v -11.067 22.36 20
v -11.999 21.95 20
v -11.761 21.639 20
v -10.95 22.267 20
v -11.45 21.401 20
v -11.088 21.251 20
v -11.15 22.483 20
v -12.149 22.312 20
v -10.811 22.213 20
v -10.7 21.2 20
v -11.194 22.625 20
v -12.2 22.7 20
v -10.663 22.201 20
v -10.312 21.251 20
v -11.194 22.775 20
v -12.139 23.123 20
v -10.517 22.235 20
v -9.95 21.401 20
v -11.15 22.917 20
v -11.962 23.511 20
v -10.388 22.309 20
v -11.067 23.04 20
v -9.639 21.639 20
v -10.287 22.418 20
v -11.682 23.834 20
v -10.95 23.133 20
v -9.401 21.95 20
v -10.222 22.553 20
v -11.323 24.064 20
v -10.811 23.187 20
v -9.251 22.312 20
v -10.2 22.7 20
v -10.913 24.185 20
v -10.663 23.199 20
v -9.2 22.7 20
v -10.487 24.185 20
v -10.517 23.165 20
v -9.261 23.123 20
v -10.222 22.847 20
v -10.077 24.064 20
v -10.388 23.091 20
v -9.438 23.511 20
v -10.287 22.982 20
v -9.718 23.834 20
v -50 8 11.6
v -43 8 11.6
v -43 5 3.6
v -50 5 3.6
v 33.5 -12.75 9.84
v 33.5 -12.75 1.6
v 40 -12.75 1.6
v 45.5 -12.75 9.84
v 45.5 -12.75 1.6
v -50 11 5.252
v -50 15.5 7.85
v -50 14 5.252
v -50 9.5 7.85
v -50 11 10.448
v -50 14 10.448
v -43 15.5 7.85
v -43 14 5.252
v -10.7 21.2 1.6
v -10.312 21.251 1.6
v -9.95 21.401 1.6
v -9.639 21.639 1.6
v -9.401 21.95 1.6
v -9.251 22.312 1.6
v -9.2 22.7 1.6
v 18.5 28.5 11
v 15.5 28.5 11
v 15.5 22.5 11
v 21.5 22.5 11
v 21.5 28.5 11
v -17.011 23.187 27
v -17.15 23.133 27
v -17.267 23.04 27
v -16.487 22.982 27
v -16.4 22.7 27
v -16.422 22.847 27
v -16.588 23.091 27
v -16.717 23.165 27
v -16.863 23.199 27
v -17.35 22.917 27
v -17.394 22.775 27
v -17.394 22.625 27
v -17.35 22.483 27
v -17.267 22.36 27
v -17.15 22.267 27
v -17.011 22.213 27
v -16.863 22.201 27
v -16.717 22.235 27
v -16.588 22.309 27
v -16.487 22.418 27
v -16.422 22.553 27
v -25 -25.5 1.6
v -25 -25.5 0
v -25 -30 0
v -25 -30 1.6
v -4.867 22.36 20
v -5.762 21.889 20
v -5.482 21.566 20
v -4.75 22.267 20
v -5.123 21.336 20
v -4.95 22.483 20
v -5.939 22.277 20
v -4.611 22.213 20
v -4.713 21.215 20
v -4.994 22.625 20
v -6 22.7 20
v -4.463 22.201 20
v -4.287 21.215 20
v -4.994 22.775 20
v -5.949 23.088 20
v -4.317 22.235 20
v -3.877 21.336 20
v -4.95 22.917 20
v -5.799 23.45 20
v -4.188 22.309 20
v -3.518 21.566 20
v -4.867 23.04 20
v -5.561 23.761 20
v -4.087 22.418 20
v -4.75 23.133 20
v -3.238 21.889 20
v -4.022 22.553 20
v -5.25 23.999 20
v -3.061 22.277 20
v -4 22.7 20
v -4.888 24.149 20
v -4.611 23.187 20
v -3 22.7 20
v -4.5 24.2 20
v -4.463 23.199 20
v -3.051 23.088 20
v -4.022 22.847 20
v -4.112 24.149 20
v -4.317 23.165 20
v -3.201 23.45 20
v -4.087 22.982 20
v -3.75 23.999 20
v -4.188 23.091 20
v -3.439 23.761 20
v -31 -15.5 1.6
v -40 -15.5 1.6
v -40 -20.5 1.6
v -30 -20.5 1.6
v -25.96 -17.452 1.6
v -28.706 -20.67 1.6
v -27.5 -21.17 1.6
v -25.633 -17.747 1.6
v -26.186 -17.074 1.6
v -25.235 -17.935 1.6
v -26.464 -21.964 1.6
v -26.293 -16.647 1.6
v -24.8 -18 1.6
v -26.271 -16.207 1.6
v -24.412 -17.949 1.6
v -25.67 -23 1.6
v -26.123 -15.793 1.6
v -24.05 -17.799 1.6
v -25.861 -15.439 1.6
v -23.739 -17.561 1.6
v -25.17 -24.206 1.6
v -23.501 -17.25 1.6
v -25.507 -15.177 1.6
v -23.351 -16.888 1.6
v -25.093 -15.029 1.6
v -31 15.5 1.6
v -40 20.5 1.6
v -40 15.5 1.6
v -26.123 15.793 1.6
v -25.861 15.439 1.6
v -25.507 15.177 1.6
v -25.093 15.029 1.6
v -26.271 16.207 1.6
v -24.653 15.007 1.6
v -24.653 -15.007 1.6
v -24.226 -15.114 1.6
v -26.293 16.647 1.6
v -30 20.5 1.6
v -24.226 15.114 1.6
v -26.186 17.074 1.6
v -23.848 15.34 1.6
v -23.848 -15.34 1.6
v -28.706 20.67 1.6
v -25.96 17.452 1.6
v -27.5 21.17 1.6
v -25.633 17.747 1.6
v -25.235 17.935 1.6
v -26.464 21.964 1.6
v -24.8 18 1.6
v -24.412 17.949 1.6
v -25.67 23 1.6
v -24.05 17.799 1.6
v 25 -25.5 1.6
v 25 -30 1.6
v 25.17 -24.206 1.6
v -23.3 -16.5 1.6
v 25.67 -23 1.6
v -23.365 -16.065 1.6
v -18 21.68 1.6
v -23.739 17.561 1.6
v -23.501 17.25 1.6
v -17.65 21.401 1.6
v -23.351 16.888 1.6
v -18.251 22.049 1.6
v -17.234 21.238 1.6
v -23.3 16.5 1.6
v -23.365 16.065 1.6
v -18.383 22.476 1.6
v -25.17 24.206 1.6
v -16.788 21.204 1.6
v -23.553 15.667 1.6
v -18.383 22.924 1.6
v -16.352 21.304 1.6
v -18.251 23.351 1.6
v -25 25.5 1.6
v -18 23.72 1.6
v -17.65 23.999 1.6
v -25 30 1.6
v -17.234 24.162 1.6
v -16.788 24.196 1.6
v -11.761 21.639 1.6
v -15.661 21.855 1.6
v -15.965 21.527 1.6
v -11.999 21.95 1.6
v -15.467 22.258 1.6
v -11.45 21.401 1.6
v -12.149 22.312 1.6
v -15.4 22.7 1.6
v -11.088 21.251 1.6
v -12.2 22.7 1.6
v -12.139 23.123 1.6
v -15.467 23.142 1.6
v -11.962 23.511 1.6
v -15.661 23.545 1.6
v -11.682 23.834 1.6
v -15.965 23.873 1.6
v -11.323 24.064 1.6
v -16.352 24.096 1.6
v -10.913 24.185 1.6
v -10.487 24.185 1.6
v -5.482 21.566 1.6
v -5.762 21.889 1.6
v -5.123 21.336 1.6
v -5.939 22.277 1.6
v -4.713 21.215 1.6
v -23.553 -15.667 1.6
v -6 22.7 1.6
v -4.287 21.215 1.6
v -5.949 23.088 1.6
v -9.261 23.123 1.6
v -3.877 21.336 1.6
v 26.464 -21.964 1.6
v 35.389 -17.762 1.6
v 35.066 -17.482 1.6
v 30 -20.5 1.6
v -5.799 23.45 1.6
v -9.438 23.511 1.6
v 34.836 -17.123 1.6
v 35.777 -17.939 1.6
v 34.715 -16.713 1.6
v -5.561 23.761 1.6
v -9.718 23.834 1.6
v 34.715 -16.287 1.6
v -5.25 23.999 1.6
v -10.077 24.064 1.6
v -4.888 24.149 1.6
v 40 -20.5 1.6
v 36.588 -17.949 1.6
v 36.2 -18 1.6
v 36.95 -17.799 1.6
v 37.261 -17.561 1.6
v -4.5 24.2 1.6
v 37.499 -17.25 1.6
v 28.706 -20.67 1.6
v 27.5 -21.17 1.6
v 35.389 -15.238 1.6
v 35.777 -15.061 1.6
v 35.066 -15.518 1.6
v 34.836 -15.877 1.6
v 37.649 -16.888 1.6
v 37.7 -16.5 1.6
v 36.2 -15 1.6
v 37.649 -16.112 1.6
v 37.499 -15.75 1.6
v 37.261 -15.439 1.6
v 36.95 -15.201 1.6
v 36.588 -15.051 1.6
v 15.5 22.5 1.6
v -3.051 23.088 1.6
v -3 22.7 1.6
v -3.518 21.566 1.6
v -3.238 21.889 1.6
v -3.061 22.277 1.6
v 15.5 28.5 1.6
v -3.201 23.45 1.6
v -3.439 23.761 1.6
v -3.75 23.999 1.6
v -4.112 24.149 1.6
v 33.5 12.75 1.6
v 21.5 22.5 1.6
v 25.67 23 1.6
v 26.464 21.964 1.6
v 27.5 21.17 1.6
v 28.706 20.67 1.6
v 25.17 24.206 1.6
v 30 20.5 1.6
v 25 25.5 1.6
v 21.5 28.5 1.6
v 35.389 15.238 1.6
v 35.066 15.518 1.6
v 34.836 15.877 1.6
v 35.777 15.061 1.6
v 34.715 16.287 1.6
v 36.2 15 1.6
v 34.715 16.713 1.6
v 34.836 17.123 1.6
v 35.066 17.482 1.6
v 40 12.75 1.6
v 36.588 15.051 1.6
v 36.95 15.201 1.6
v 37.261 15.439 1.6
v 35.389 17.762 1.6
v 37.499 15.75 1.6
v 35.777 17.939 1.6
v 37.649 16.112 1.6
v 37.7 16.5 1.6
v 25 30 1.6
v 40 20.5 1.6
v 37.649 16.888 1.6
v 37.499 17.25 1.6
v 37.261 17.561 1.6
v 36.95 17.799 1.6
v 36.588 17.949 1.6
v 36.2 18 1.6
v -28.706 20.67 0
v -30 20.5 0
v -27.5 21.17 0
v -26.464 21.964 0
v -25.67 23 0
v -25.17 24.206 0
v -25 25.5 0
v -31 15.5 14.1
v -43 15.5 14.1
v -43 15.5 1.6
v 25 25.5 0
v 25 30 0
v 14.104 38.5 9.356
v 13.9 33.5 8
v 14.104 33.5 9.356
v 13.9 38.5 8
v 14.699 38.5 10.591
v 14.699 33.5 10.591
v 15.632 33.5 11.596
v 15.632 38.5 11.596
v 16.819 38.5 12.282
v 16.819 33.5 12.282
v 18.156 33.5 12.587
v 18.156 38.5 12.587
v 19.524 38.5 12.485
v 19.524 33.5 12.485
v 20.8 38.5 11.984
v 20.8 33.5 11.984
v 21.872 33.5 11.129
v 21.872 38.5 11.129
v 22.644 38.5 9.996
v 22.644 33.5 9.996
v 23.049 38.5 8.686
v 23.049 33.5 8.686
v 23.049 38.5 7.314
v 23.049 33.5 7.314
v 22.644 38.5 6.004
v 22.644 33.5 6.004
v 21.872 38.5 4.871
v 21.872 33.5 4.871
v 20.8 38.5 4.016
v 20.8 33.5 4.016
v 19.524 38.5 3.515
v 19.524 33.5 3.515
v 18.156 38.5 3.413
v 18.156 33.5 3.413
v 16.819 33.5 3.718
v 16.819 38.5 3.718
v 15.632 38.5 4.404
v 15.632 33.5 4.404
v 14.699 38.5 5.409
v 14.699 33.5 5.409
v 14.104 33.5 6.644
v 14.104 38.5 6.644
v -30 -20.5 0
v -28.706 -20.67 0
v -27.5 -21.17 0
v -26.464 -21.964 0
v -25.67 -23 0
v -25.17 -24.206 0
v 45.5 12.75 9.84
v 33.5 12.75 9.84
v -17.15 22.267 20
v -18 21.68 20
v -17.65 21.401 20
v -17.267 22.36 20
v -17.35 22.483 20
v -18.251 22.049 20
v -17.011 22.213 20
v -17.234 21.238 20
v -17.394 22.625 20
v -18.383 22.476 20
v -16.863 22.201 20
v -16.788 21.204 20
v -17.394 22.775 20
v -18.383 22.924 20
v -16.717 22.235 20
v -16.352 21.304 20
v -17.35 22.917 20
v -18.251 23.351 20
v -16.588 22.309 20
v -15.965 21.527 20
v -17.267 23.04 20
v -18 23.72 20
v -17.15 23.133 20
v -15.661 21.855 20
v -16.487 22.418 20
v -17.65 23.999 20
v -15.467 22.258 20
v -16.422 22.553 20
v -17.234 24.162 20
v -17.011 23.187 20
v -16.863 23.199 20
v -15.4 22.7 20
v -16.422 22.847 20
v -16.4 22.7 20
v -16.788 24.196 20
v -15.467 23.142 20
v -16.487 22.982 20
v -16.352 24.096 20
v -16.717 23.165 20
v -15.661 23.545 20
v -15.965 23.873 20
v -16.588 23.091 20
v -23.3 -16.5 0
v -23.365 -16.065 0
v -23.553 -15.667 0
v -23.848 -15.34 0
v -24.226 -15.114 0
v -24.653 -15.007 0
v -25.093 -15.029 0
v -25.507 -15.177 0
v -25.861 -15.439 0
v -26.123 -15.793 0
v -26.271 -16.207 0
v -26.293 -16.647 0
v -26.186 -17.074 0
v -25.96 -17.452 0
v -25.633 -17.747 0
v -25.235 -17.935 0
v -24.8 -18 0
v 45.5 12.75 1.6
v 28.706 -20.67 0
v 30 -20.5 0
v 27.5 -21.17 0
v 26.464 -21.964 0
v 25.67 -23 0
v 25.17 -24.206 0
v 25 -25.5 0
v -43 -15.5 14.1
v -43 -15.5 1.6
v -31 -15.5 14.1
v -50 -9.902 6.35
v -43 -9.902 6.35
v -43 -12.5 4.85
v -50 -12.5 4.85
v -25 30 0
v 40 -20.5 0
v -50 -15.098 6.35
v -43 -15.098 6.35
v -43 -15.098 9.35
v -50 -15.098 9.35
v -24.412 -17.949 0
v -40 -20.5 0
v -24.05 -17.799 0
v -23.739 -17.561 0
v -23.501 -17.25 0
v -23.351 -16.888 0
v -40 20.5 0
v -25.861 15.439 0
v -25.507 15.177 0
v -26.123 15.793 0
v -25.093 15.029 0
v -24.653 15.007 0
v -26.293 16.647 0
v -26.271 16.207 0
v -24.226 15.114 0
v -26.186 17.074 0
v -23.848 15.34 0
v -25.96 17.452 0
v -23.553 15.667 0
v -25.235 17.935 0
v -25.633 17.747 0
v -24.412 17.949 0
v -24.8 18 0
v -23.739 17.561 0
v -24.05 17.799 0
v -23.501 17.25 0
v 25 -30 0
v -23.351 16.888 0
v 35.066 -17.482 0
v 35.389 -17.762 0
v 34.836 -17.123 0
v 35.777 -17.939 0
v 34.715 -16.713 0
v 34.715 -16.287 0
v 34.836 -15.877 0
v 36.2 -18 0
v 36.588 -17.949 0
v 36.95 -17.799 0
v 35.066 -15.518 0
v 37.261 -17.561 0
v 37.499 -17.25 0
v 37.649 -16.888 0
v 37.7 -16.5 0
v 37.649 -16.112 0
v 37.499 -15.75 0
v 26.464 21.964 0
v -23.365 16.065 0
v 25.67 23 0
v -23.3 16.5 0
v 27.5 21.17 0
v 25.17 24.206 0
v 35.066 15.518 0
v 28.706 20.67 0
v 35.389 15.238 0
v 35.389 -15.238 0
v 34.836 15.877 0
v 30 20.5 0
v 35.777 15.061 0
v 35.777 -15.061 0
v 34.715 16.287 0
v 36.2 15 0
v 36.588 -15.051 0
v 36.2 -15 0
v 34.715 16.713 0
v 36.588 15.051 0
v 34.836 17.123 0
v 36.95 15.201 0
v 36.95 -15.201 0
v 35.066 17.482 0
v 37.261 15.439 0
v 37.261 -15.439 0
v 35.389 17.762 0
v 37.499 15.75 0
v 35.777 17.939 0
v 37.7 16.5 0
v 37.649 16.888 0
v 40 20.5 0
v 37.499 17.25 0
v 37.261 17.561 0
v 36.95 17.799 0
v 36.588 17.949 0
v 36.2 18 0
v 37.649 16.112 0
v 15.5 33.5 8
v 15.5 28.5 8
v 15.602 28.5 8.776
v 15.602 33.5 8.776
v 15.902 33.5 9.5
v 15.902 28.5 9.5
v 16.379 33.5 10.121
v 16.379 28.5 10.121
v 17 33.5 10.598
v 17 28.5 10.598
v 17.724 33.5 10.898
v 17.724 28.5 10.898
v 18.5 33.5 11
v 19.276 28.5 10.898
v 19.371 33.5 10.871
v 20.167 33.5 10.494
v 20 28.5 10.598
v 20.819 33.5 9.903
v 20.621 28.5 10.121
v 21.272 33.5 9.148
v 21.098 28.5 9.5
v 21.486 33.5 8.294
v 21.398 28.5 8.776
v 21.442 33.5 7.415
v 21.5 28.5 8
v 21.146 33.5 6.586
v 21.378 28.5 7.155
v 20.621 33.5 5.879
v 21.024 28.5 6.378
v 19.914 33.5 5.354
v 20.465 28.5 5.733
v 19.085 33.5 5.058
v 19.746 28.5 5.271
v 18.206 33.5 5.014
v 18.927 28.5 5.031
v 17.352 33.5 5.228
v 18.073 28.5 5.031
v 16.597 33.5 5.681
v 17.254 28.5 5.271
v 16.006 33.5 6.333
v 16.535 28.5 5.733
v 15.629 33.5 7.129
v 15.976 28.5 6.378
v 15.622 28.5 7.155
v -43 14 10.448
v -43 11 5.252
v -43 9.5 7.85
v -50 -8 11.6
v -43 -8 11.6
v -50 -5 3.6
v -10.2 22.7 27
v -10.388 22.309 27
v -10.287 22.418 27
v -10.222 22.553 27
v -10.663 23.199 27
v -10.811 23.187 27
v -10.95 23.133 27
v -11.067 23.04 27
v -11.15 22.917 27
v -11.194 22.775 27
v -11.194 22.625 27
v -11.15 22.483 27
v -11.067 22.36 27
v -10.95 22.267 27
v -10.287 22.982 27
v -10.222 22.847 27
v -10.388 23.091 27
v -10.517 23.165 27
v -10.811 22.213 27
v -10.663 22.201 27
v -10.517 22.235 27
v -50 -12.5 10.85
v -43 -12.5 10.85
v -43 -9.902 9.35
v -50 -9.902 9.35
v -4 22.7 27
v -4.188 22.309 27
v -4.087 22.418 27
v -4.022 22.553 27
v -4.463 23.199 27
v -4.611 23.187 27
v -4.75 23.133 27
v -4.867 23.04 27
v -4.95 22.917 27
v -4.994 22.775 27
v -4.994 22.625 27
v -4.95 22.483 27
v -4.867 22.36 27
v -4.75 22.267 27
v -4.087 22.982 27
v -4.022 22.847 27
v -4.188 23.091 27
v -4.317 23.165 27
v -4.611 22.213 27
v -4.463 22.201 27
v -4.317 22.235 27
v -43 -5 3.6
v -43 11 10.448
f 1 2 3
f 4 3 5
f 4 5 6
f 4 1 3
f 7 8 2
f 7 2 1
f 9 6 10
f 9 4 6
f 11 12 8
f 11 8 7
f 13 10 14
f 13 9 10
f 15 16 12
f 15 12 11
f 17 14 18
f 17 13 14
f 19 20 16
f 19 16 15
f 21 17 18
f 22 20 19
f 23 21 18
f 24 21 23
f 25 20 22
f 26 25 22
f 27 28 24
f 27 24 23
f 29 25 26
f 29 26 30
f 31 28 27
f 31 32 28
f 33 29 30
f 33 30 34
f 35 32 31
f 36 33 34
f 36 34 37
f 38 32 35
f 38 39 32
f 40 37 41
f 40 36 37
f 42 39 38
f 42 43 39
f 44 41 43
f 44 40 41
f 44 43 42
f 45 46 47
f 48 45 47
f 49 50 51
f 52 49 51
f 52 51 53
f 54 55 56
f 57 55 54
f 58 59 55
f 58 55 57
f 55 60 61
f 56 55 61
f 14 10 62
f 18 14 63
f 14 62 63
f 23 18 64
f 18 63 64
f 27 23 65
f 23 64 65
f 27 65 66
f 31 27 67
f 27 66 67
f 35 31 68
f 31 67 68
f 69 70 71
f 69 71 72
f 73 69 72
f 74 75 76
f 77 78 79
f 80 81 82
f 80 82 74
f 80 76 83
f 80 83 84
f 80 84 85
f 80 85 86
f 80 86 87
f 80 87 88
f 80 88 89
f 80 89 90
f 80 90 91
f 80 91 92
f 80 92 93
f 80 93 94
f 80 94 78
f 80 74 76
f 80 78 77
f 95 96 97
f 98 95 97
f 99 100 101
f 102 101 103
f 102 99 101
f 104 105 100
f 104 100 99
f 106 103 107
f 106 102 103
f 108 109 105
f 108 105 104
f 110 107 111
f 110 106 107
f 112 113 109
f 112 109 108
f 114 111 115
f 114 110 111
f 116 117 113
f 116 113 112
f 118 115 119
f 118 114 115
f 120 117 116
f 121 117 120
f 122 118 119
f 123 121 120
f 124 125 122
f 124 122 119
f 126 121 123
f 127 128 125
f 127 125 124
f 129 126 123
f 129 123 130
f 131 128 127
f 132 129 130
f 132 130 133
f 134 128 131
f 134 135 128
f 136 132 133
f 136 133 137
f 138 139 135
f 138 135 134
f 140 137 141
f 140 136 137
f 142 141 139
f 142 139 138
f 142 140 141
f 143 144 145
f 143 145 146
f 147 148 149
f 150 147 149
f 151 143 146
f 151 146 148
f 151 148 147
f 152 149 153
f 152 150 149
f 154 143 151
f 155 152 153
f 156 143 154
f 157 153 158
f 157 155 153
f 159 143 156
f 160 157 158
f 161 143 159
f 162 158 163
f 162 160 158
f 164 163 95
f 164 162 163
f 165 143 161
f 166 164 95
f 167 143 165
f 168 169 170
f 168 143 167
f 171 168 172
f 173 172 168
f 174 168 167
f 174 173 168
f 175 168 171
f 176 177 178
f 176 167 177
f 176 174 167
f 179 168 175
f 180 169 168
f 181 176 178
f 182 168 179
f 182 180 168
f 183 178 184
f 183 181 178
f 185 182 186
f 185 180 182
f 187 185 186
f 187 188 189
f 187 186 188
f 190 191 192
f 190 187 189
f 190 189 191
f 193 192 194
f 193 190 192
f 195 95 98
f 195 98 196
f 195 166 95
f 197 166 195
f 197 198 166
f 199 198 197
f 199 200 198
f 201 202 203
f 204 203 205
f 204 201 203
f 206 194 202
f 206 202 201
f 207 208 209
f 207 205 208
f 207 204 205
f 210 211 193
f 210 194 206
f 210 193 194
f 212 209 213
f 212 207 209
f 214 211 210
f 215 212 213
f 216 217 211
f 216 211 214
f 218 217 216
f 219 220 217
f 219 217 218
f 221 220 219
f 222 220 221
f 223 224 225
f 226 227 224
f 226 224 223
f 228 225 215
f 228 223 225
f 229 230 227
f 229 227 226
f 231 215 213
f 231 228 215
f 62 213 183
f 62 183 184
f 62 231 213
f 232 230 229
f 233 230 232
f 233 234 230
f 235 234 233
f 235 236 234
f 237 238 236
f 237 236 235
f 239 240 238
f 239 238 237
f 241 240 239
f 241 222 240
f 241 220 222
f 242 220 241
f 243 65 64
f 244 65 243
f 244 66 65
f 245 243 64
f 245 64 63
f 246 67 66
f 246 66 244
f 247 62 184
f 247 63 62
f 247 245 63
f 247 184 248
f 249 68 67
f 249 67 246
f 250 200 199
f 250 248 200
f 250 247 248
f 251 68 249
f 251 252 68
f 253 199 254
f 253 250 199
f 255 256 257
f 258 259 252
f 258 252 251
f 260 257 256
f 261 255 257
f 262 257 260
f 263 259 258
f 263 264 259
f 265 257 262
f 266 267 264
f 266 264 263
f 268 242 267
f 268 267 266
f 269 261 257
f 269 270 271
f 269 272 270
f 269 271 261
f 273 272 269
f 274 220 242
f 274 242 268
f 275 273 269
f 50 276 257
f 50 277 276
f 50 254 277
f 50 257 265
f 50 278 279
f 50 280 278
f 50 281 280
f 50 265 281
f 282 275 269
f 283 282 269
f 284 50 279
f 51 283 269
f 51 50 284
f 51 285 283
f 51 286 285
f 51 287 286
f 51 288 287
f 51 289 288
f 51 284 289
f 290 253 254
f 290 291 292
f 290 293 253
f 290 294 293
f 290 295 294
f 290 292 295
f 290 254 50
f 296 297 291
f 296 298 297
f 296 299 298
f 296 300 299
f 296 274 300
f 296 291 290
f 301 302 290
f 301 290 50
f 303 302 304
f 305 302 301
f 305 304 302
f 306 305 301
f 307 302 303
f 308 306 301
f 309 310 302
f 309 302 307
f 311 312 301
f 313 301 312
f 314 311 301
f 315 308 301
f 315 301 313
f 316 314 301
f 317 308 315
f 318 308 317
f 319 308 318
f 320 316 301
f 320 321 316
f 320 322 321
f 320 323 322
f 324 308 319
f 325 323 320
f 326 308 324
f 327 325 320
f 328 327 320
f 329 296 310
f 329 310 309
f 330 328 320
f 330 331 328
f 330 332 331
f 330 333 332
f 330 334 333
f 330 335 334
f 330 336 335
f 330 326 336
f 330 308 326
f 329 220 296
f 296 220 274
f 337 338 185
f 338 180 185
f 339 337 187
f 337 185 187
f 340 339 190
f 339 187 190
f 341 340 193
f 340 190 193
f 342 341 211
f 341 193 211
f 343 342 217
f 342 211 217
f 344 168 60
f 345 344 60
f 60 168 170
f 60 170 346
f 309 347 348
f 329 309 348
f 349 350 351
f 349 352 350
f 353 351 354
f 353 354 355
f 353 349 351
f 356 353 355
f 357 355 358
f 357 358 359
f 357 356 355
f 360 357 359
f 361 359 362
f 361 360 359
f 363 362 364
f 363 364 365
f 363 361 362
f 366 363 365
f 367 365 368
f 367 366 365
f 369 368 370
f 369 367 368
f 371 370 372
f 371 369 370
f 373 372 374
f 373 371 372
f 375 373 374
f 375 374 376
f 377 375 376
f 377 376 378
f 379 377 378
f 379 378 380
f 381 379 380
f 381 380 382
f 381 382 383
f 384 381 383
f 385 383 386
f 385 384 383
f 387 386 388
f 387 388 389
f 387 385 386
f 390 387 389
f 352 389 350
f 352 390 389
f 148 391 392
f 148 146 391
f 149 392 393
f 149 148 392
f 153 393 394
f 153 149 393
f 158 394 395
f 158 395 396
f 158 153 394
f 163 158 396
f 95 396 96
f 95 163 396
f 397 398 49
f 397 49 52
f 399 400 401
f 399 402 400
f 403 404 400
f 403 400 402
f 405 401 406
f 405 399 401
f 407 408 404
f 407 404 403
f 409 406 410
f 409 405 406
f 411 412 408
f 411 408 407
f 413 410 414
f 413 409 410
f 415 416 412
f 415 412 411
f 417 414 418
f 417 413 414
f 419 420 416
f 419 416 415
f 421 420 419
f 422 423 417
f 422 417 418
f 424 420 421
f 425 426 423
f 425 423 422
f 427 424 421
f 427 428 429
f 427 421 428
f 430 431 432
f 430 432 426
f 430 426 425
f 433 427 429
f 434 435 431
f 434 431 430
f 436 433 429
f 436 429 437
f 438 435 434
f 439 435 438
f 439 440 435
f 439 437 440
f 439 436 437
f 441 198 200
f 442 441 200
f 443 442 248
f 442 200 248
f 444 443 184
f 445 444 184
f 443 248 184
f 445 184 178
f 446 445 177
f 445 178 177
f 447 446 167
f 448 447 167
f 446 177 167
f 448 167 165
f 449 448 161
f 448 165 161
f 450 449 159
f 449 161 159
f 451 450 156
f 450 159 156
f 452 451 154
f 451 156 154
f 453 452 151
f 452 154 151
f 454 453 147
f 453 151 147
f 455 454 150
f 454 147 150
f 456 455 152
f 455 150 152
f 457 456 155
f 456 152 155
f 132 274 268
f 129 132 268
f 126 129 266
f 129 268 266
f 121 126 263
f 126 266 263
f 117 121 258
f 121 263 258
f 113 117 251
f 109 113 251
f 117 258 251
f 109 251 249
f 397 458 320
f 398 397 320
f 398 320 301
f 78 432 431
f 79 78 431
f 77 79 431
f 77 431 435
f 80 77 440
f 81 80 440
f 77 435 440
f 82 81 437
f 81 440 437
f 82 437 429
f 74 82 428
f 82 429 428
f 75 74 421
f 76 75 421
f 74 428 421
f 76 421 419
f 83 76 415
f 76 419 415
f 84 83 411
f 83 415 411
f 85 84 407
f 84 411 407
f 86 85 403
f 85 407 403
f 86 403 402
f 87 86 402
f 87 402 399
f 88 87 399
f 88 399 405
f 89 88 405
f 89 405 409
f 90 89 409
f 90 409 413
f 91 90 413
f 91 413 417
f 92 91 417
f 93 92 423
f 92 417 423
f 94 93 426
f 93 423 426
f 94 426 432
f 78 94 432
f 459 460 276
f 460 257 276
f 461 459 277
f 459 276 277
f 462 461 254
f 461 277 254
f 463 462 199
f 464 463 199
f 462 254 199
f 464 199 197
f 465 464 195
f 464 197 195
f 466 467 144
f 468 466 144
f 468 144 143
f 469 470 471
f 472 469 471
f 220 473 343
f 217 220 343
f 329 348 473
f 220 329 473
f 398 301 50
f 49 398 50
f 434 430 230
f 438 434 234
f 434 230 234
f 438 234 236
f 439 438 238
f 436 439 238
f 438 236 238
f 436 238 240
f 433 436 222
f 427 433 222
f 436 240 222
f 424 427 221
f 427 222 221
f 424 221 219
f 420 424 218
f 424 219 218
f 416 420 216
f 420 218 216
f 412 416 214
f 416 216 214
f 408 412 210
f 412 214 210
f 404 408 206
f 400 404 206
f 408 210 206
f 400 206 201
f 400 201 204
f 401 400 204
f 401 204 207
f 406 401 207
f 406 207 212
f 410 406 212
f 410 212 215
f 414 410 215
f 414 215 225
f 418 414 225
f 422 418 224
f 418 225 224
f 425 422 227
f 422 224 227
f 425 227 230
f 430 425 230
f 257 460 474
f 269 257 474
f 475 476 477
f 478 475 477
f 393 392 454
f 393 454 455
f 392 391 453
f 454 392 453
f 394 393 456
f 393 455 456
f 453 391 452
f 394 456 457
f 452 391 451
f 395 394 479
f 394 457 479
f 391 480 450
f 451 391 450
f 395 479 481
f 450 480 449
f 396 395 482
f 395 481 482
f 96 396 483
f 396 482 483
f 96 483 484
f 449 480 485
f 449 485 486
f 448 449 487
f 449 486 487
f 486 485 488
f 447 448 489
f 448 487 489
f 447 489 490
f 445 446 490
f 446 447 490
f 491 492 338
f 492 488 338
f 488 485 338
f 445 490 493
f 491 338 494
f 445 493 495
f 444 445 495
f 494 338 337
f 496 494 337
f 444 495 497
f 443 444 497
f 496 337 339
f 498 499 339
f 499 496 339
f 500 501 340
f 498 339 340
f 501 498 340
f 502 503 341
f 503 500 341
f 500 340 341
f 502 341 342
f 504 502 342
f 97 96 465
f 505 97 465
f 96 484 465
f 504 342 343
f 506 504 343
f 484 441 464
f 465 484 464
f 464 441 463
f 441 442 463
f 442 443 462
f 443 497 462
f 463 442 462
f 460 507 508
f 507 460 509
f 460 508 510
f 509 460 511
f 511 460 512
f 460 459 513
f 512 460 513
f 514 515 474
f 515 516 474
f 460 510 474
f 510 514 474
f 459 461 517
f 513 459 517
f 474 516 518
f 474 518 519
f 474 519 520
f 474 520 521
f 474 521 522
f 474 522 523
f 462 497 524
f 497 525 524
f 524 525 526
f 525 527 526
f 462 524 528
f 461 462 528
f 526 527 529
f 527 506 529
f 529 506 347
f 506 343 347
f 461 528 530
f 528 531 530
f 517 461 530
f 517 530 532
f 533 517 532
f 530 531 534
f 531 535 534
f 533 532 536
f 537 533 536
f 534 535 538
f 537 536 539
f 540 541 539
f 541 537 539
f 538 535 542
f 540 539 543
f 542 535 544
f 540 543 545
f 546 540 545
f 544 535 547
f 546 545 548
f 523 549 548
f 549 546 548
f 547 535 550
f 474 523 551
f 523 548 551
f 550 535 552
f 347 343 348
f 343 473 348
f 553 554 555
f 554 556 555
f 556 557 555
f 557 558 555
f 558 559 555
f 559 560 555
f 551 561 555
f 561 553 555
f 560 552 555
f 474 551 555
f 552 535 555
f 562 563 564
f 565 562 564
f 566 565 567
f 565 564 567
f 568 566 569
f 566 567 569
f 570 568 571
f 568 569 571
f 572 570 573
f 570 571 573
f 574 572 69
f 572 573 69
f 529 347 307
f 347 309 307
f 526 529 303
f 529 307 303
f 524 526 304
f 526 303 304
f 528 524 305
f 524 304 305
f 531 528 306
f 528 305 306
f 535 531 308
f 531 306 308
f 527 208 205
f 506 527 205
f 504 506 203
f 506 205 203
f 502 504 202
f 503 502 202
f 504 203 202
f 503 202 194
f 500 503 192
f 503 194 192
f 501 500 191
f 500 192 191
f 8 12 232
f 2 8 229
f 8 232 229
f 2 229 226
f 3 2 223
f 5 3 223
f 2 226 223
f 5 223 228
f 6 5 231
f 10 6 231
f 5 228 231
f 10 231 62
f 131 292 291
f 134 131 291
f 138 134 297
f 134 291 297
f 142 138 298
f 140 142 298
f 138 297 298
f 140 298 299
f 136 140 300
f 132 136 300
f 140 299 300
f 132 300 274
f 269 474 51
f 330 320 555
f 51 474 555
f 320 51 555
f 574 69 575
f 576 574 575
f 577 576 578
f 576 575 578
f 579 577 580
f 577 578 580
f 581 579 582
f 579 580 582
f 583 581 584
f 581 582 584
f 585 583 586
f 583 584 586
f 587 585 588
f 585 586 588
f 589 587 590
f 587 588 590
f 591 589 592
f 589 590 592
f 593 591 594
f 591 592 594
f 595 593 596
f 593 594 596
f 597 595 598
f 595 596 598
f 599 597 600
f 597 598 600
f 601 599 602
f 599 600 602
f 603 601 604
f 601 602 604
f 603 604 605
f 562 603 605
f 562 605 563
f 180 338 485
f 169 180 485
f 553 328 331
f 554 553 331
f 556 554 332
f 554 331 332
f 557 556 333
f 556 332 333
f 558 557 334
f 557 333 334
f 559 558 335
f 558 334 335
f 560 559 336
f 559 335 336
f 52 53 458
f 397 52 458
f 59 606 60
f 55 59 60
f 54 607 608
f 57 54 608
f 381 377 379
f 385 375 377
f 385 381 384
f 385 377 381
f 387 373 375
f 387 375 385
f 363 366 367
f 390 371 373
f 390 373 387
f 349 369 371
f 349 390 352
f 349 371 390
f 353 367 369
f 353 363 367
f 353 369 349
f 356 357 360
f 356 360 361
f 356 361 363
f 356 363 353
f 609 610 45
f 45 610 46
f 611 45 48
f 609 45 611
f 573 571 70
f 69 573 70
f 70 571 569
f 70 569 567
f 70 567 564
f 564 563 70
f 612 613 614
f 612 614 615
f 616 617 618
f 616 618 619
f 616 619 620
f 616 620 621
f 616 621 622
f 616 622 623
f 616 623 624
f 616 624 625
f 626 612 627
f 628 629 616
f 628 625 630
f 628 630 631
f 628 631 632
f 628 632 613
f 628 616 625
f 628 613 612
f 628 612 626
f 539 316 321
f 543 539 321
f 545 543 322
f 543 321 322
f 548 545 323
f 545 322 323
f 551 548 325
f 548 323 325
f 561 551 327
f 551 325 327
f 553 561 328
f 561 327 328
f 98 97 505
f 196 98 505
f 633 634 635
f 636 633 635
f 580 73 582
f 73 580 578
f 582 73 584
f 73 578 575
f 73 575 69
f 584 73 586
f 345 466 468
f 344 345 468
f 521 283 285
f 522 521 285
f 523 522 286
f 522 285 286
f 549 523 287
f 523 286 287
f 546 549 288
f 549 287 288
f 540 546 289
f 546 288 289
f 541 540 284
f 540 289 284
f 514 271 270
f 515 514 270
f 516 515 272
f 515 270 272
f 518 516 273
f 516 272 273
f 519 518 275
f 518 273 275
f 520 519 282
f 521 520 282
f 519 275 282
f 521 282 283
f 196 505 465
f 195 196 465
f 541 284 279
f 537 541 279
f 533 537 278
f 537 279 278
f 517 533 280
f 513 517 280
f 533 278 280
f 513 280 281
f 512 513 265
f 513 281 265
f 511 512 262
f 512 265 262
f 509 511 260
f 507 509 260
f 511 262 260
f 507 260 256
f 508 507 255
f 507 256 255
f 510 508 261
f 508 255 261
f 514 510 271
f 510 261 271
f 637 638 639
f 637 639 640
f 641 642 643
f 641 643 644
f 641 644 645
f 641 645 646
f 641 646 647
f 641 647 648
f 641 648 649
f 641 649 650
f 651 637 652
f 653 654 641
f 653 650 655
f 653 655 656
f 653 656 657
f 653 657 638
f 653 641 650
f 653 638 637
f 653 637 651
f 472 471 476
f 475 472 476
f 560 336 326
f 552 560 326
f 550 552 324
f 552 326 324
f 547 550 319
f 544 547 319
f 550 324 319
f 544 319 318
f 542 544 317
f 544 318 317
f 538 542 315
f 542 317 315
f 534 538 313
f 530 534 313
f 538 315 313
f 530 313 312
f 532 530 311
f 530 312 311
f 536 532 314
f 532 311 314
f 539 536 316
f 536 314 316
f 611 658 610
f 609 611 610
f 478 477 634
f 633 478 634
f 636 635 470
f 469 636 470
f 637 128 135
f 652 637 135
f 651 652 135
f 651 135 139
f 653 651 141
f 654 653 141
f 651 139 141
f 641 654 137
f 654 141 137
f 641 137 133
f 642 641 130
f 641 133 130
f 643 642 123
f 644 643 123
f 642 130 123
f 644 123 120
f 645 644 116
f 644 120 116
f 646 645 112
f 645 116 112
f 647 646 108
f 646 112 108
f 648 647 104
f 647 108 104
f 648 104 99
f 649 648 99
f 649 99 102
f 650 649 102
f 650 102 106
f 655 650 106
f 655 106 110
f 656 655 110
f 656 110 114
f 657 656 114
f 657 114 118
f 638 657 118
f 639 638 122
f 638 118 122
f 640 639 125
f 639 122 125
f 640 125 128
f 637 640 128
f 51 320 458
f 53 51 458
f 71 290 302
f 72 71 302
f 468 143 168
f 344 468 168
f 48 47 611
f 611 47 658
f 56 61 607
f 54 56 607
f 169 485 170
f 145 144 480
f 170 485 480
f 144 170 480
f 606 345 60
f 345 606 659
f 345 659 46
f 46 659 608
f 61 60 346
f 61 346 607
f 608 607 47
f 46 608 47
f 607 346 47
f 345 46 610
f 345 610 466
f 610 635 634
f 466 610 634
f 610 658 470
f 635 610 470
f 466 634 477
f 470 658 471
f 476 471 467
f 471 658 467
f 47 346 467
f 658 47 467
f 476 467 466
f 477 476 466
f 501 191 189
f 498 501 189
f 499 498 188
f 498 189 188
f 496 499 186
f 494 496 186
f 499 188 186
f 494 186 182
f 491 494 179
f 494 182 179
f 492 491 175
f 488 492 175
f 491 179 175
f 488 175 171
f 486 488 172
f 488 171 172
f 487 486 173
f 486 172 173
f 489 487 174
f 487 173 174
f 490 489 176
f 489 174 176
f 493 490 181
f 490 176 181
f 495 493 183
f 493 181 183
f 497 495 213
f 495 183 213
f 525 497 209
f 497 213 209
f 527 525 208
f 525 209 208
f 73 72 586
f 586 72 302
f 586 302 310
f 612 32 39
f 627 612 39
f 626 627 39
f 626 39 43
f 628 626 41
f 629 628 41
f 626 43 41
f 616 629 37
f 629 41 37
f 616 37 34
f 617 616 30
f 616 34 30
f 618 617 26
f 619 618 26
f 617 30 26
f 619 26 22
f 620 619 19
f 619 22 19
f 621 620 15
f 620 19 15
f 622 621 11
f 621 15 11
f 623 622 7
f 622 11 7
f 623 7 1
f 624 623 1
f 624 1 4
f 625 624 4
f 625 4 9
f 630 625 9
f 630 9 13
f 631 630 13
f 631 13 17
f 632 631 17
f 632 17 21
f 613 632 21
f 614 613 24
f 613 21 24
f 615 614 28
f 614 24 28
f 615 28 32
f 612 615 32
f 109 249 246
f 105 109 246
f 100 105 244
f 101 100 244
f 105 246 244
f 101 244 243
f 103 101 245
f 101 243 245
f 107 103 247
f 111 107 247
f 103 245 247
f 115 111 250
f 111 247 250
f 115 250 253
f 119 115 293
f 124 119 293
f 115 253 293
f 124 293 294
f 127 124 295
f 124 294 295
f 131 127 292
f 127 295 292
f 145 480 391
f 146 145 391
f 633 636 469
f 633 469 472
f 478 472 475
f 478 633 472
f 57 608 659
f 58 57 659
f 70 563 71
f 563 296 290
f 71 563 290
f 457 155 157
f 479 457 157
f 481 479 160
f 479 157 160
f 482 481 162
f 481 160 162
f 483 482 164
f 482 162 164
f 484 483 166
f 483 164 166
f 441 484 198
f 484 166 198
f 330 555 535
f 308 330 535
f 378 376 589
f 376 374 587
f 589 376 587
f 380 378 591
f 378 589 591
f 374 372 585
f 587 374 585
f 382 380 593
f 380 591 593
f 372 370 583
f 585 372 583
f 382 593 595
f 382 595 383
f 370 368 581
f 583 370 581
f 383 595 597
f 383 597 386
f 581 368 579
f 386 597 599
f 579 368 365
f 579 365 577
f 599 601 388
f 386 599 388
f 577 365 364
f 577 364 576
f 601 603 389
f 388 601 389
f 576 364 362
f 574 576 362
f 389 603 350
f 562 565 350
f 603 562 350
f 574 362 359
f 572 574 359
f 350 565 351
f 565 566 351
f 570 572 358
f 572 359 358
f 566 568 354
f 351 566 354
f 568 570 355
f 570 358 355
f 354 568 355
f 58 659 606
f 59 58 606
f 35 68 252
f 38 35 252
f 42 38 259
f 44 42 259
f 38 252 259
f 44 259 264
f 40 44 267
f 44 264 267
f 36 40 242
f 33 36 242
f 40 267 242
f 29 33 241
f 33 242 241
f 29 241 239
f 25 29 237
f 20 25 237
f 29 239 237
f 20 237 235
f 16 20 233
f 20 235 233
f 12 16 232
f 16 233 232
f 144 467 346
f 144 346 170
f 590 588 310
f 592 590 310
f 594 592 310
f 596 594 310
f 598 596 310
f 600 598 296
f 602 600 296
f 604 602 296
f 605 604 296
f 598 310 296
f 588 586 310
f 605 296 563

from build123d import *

# Parameters (mm, degrees)
F1_DEPTH  = 1.6
F3_DEPTH  = 8.24
F5_DEPTH  = 12.5
F7_DEPTH  = 7
F9_DEPTH  = 2
F10_R     = 1.5
F11_DEPTH = 18.4
F12_R     = 0.5
F13_DEPTH = 7
F14_R     = 0.5
F15_DEPTH = 7
F17_DEPTH = 1.6
F20_R     = 5
F22_DEPTH = 9.4
F24_DEPTH = 7.5
F25_R     = 4.6
F26_DEPTH = 2.5
F27_R     = 0.5
F28_DEPTH = 7


with BuildPart() as f1:
    # F0 (on Top) → F1 (new body)
    with BuildSketch(Plane.XY):
        Polygon((-25, 20.5), (-40, 20.5), (-40, -20.5), (-25, -20.5), (0, -20.5), (25, -20.5), (40, -20.5), (40, 20.5), (25, 20.5), (0, 20.5), align=None)
        Polygon((-25, 30), (-25, 20.5), (0, 20.5), (25, 20.5), (25, 30), align=None)
        Polygon((0, -20.5), (-25, -20.5), (-25, -30), (25, -30), (25, -20.5), align=None)
    extrude(amount=F1_DEPTH)

    # F2 (on face) → F3 (join)
    with BuildSketch(Plane.XY.offset(1.6)):
        Polygon((40, -12.75), (40, 0), (40, 12.75), (33.5, 12.75), (33.5, -12.75), align=None)
        Polygon((40, 12.75), (40, 0), (40, -12.75), (45.5, -12.75), (45.5, 12.75), align=None)
    extrude(amount=F3_DEPTH)

    # F4 (on face) → F5 (join)
    with BuildSketch(Plane.XY.offset(1.6)):
        Polygon((-40, -15.5), (-40, 0), (-40, 15.5), (-43, 15.5), (-43, -15.5), align=None)
        Polygon((-40, 15.5), (-40, 0), (-40, -15.5), (-31, -15.5), (-31, 15.5), align=None)
    extrude(amount=F5_DEPTH)

    # F6 (on face) → F7 (join)
    with BuildSketch(Plane(origin=(-43, 0, 0), x_dir=(0, -1, 0), z_dir=(-1, 0, 0))):
        Polygon((0, 11.6), (0, 3.6), (5, 3.6), (8, 11.6), align=None)
        Polygon((-5, 3.6), (0, 3.6), (0, 11.6), (-8, 11.6), align=None)
        Polygon((-14, 10.4480762114), (-15.5, 7.85), (-14, 5.2519237886), (-11, 5.2519237886), (-9.5, 7.85), (-11, 10.4480762114), align=None)
        Polygon((15.0980762114, 9.35), (12.5, 10.85), (9.9019237886, 9.35), (9.9019237886, 6.35), (12.5, 4.85), (15.0980762114, 6.35), (15.0980762114, 7.85), align=None)
    extrude(amount=F7_DEPTH)

    # F8 (on face) → F9 (cut)
    with BuildSketch(Plane.XY.offset(1.6)):
        with BuildLine():
            ThreePointArc((37.7, 16.5), (37.2606601718, 17.5606601718), (36.2, 18))
            Line((36.2, 18), (36.2, 16.5))
            Line((36.2, 16.5), (36.2, 15))
            ThreePointArc((36.2, 15), (37.2606601718, 15.4393398282), (37.7, 16.5))
        make_face()
        with BuildLine():
            ThreePointArc((-23.3, -16.5), (-25.8606601718, -15.4393398282), (-24.8, -18))
            ThreePointArc((-24.8, -18), (-23.7393398282, -17.5606601718), (-23.3, -16.5))
        make_face()
        with BuildLine():
            ThreePointArc((37.7, -16.5), (37.2606601718, -15.4393398282), (36.2, -15))
            Line((36.2, -15), (36.2, -16.5))
            Line((36.2, -16.5), (36.2, -18))
            ThreePointArc((36.2, -18), (37.2606601718, -17.5606601718), (37.7, -16.5))
        make_face()
        with BuildLine():
            Line((36.2, -16.5), (36.2, -15))
            ThreePointArc((36.2, -15), (34.7, -16.5), (36.2, -18))
            Line((36.2, -18), (36.2, -16.5))
        make_face()
        with BuildLine():
            Line((36.2, 16.5), (36.2, 18))
            ThreePointArc((36.2, 18), (34.7, 16.5), (36.2, 15))
            Line((36.2, 15), (36.2, 16.5))
        make_face()
        with BuildLine():
            ThreePointArc((-24.8, 18), (-25.8606601718, 15.4393398282), (-23.3, 16.5))
            ThreePointArc((-23.3, 16.5), (-23.7393398282, 17.5606601718), (-24.8, 18))
        make_face()
    extrude(amount=-F9_DEPTH, mode=Mode.SUBTRACT)

    # F10 (on face) → F11 (join)
    with BuildSketch(Plane.XY.offset(1.6)):
        with BuildLine():
            ThreePointArc((-10.7, 21.2), (-9.6393398282, 21.6393398282), (-9.2, 22.7))
            Line((-9.2, 22.7), (-10.7, 22.7))
            Line((-10.7, 22.7), (-10.7, 21.2))
        make_face()
        with BuildLine():
            ThreePointArc((-4.5, 24.2), (-5.5606601718, 23.7606601718), (-6, 22.7))
            Line((-6, 22.7), (-4.5, 22.7))
            Line((-4.5, 22.7), (-4.5, 24.2))
        make_face()
        with BuildLine():
            Line((-4.5, 22.7), (-6, 22.7))
            ThreePointArc((-6, 22.7), (-4.5, 21.2), (-3, 22.7))
            ThreePointArc((-3, 22.7), (-3.4393398282, 23.7606601718), (-4.5, 24.2))
            Line((-4.5, 24.2), (-4.5, 22.7))
        make_face()
        with BuildLine():
            Line((-10.7, 22.7), (-9.2, 22.7))
            ThreePointArc((-9.2, 22.7), (-10.7, 24.2), (-12.2, 22.7))
            Line((-12.2, 22.7), (-10.7, 22.7))
        make_face()
        with Locations((-16.9, 22.7)):
            Circle(F10_R)
        with BuildLine():
            Line((-10.7, 21.2), (-10.7, 22.7))
            Line((-10.7, 22.7), (-12.2, 22.7))
            ThreePointArc((-12.2, 22.7), (-11.7606601718, 21.6393398282), (-10.7, 21.2))
        make_face()
    extrude(amount=F11_DEPTH)

    # F12 (on face) → F13 (join)
    with BuildSketch(Plane.XY.offset(20)):
        with Locations((-10.7, 22.7)):
            Circle(F12_R)
    extrude(amount=F13_DEPTH)

    # F14 (on face) → F15 (join)
    with BuildSketch(Plane.XY.offset(20)):
        with Locations((-4.5, 22.7)):
            Circle(F14_R)
    extrude(amount=F15_DEPTH)

    # F20
    f20_edges = [f1.edges().sort_by_distance(p)[0] for p in [
        (-25, 20.5, 0.8),
        (25, 20.5, 0.8),
        (25, -20.5, 0.8),
        (-25, -20.5, 0.8),
    ]]
    fillet(f20_edges, radius=F20_R)

    # F21 (on face) → F22 (join)
    with BuildSketch(Plane.XY.offset(1.6)):
        Polygon((21.5, 28.5), (18.5, 28.5), (15.5, 28.5), (15.5, 22.5), (21.5, 22.5), align=None)
    extrude(amount=F22_DEPTH)

    # F23 (on face) → F24 (join)
    with BuildSketch(Plane(origin=(0, 28.5, 0), x_dir=(-1, 0, 0), z_dir=(0, 1, 0))):
        with BuildLine():
            ThreePointArc((-18.5, 11), (-20.6213203436, 5.8786796564), (-15.5, 8))
            ThreePointArc((-15.5, 8), (-16.3786796564, 10.1213203436), (-18.5, 11))
        make_face()
    extrude(amount=F24_DEPTH)

    # F25 (on face) → F26 (join, symmetric)
    with BuildSketch(Plane(origin=(0, 36, 0), x_dir=(-1, 0, 0), z_dir=(0, 1, 0))):
        with Locations((-18.5, 8)):
            Circle(F25_R)
    extrude(amount=F26_DEPTH, both=True)

    # F27 (on face) → F28 (join)
    with BuildSketch(Plane.XY.offset(20)):
        with Locations((-16.9, 22.7)):
            Circle(F27_R)
    extrude(amount=F28_DEPTH)


with BuildPart() as f17:
    # F16 (on face) → F17 (new body)
    with BuildSketch(Plane.XY.offset(1.6)):
        Polygon((-57.5, 30), (-57.5, 20.5), (-32.5, 20.5), (-7.5, 20.5), (-7.5, 30), align=None)
    extrude(amount=-F17_DEPTH)


with BuildPart() as f17b:
    # F16 (on face) → F17, piece 2 (new body)
    with BuildSketch(Plane.XY.offset(1.6)):
        Polygon((-7.5, -20.5), (-32.5, -20.5), (-57.5, -20.5), (-57.5, -31.8096540868), (-7.5, -31.8096540868), align=None)
    extrude(amount=-F17_DEPTH)


solid = f1.part
